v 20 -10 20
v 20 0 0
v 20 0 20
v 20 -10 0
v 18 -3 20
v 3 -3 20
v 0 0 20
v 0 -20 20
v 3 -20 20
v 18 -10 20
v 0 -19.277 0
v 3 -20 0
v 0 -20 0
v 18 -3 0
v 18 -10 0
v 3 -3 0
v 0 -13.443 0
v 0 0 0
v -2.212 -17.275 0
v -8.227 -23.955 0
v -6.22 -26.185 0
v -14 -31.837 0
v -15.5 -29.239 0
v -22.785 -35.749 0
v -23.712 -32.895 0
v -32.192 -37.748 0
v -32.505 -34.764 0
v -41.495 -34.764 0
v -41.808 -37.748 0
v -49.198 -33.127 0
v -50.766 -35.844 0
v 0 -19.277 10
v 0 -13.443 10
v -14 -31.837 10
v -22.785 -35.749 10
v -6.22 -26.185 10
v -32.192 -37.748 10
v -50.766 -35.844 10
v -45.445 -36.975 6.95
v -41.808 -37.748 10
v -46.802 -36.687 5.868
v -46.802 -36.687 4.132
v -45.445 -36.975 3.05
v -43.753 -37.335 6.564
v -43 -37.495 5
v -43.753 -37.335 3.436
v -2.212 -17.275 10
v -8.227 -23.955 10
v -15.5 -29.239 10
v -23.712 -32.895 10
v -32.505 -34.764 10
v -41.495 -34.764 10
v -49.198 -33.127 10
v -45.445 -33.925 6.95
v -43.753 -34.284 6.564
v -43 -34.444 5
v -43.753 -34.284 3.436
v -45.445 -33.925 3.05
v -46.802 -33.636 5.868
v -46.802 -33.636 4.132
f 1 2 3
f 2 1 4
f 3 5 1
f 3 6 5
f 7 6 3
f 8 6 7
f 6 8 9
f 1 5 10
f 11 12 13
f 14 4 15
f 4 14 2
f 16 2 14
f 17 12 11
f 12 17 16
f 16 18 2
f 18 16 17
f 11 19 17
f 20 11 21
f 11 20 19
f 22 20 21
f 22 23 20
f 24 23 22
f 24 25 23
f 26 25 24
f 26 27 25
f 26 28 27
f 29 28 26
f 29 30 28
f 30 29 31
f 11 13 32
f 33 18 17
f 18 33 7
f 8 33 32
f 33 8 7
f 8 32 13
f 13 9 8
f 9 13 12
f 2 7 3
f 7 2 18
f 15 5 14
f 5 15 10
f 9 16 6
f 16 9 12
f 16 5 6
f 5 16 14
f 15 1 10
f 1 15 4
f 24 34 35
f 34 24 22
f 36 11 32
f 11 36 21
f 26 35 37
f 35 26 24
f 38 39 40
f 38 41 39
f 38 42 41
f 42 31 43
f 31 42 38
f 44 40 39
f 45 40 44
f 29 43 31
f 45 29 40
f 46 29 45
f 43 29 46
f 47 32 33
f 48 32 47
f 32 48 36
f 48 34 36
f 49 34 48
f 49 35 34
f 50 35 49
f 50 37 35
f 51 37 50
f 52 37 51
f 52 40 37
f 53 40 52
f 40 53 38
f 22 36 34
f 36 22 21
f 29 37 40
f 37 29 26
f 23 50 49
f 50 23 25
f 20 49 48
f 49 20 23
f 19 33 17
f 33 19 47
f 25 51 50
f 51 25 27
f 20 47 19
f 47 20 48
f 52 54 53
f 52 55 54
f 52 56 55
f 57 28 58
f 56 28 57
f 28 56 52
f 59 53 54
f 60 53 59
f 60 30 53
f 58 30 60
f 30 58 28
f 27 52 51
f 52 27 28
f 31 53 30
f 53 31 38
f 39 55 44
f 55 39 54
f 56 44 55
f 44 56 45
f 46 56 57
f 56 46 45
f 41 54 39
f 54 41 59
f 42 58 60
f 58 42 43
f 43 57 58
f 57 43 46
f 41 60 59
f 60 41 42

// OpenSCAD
// file: phone_grip1.scad
/*

	Arm/Gripper to hold phone (in a case) for telescope mount

*/

module gripper() {
	difference() {
		cube([20,20,20]);
		translate([3,3,-4]) cube([15,30,30]);
		translate([14,10,-4]) cube([20,20,30]);
	}
}




module arm() {
	difference() {
		difference() {
			cylinder(h = 10, r=46, center=false);
			translate([0,0,-5]) cylinder(h = 20, r=43, center=false);
		}

		translate([-50,-80,-10]) cube([60,90,40]);
		translate([0,-50,-10]) cube([60,190,40]);
	}

	
}


module phone_gripper_arm() {
	gripper();
	difference() {
		translate([-37,-8,0]) rotate([0,0,300]) arm();
		// bolt hole
		translate([-45,30,5]) rotate([90,0,0]) cylinder(h=30,r=2, center=true);

	}
}	


//phone_gripper_arm();
// main file
include <phone_grip1.scad>;

mirror([0,1,0]) phone_gripper_arm();
